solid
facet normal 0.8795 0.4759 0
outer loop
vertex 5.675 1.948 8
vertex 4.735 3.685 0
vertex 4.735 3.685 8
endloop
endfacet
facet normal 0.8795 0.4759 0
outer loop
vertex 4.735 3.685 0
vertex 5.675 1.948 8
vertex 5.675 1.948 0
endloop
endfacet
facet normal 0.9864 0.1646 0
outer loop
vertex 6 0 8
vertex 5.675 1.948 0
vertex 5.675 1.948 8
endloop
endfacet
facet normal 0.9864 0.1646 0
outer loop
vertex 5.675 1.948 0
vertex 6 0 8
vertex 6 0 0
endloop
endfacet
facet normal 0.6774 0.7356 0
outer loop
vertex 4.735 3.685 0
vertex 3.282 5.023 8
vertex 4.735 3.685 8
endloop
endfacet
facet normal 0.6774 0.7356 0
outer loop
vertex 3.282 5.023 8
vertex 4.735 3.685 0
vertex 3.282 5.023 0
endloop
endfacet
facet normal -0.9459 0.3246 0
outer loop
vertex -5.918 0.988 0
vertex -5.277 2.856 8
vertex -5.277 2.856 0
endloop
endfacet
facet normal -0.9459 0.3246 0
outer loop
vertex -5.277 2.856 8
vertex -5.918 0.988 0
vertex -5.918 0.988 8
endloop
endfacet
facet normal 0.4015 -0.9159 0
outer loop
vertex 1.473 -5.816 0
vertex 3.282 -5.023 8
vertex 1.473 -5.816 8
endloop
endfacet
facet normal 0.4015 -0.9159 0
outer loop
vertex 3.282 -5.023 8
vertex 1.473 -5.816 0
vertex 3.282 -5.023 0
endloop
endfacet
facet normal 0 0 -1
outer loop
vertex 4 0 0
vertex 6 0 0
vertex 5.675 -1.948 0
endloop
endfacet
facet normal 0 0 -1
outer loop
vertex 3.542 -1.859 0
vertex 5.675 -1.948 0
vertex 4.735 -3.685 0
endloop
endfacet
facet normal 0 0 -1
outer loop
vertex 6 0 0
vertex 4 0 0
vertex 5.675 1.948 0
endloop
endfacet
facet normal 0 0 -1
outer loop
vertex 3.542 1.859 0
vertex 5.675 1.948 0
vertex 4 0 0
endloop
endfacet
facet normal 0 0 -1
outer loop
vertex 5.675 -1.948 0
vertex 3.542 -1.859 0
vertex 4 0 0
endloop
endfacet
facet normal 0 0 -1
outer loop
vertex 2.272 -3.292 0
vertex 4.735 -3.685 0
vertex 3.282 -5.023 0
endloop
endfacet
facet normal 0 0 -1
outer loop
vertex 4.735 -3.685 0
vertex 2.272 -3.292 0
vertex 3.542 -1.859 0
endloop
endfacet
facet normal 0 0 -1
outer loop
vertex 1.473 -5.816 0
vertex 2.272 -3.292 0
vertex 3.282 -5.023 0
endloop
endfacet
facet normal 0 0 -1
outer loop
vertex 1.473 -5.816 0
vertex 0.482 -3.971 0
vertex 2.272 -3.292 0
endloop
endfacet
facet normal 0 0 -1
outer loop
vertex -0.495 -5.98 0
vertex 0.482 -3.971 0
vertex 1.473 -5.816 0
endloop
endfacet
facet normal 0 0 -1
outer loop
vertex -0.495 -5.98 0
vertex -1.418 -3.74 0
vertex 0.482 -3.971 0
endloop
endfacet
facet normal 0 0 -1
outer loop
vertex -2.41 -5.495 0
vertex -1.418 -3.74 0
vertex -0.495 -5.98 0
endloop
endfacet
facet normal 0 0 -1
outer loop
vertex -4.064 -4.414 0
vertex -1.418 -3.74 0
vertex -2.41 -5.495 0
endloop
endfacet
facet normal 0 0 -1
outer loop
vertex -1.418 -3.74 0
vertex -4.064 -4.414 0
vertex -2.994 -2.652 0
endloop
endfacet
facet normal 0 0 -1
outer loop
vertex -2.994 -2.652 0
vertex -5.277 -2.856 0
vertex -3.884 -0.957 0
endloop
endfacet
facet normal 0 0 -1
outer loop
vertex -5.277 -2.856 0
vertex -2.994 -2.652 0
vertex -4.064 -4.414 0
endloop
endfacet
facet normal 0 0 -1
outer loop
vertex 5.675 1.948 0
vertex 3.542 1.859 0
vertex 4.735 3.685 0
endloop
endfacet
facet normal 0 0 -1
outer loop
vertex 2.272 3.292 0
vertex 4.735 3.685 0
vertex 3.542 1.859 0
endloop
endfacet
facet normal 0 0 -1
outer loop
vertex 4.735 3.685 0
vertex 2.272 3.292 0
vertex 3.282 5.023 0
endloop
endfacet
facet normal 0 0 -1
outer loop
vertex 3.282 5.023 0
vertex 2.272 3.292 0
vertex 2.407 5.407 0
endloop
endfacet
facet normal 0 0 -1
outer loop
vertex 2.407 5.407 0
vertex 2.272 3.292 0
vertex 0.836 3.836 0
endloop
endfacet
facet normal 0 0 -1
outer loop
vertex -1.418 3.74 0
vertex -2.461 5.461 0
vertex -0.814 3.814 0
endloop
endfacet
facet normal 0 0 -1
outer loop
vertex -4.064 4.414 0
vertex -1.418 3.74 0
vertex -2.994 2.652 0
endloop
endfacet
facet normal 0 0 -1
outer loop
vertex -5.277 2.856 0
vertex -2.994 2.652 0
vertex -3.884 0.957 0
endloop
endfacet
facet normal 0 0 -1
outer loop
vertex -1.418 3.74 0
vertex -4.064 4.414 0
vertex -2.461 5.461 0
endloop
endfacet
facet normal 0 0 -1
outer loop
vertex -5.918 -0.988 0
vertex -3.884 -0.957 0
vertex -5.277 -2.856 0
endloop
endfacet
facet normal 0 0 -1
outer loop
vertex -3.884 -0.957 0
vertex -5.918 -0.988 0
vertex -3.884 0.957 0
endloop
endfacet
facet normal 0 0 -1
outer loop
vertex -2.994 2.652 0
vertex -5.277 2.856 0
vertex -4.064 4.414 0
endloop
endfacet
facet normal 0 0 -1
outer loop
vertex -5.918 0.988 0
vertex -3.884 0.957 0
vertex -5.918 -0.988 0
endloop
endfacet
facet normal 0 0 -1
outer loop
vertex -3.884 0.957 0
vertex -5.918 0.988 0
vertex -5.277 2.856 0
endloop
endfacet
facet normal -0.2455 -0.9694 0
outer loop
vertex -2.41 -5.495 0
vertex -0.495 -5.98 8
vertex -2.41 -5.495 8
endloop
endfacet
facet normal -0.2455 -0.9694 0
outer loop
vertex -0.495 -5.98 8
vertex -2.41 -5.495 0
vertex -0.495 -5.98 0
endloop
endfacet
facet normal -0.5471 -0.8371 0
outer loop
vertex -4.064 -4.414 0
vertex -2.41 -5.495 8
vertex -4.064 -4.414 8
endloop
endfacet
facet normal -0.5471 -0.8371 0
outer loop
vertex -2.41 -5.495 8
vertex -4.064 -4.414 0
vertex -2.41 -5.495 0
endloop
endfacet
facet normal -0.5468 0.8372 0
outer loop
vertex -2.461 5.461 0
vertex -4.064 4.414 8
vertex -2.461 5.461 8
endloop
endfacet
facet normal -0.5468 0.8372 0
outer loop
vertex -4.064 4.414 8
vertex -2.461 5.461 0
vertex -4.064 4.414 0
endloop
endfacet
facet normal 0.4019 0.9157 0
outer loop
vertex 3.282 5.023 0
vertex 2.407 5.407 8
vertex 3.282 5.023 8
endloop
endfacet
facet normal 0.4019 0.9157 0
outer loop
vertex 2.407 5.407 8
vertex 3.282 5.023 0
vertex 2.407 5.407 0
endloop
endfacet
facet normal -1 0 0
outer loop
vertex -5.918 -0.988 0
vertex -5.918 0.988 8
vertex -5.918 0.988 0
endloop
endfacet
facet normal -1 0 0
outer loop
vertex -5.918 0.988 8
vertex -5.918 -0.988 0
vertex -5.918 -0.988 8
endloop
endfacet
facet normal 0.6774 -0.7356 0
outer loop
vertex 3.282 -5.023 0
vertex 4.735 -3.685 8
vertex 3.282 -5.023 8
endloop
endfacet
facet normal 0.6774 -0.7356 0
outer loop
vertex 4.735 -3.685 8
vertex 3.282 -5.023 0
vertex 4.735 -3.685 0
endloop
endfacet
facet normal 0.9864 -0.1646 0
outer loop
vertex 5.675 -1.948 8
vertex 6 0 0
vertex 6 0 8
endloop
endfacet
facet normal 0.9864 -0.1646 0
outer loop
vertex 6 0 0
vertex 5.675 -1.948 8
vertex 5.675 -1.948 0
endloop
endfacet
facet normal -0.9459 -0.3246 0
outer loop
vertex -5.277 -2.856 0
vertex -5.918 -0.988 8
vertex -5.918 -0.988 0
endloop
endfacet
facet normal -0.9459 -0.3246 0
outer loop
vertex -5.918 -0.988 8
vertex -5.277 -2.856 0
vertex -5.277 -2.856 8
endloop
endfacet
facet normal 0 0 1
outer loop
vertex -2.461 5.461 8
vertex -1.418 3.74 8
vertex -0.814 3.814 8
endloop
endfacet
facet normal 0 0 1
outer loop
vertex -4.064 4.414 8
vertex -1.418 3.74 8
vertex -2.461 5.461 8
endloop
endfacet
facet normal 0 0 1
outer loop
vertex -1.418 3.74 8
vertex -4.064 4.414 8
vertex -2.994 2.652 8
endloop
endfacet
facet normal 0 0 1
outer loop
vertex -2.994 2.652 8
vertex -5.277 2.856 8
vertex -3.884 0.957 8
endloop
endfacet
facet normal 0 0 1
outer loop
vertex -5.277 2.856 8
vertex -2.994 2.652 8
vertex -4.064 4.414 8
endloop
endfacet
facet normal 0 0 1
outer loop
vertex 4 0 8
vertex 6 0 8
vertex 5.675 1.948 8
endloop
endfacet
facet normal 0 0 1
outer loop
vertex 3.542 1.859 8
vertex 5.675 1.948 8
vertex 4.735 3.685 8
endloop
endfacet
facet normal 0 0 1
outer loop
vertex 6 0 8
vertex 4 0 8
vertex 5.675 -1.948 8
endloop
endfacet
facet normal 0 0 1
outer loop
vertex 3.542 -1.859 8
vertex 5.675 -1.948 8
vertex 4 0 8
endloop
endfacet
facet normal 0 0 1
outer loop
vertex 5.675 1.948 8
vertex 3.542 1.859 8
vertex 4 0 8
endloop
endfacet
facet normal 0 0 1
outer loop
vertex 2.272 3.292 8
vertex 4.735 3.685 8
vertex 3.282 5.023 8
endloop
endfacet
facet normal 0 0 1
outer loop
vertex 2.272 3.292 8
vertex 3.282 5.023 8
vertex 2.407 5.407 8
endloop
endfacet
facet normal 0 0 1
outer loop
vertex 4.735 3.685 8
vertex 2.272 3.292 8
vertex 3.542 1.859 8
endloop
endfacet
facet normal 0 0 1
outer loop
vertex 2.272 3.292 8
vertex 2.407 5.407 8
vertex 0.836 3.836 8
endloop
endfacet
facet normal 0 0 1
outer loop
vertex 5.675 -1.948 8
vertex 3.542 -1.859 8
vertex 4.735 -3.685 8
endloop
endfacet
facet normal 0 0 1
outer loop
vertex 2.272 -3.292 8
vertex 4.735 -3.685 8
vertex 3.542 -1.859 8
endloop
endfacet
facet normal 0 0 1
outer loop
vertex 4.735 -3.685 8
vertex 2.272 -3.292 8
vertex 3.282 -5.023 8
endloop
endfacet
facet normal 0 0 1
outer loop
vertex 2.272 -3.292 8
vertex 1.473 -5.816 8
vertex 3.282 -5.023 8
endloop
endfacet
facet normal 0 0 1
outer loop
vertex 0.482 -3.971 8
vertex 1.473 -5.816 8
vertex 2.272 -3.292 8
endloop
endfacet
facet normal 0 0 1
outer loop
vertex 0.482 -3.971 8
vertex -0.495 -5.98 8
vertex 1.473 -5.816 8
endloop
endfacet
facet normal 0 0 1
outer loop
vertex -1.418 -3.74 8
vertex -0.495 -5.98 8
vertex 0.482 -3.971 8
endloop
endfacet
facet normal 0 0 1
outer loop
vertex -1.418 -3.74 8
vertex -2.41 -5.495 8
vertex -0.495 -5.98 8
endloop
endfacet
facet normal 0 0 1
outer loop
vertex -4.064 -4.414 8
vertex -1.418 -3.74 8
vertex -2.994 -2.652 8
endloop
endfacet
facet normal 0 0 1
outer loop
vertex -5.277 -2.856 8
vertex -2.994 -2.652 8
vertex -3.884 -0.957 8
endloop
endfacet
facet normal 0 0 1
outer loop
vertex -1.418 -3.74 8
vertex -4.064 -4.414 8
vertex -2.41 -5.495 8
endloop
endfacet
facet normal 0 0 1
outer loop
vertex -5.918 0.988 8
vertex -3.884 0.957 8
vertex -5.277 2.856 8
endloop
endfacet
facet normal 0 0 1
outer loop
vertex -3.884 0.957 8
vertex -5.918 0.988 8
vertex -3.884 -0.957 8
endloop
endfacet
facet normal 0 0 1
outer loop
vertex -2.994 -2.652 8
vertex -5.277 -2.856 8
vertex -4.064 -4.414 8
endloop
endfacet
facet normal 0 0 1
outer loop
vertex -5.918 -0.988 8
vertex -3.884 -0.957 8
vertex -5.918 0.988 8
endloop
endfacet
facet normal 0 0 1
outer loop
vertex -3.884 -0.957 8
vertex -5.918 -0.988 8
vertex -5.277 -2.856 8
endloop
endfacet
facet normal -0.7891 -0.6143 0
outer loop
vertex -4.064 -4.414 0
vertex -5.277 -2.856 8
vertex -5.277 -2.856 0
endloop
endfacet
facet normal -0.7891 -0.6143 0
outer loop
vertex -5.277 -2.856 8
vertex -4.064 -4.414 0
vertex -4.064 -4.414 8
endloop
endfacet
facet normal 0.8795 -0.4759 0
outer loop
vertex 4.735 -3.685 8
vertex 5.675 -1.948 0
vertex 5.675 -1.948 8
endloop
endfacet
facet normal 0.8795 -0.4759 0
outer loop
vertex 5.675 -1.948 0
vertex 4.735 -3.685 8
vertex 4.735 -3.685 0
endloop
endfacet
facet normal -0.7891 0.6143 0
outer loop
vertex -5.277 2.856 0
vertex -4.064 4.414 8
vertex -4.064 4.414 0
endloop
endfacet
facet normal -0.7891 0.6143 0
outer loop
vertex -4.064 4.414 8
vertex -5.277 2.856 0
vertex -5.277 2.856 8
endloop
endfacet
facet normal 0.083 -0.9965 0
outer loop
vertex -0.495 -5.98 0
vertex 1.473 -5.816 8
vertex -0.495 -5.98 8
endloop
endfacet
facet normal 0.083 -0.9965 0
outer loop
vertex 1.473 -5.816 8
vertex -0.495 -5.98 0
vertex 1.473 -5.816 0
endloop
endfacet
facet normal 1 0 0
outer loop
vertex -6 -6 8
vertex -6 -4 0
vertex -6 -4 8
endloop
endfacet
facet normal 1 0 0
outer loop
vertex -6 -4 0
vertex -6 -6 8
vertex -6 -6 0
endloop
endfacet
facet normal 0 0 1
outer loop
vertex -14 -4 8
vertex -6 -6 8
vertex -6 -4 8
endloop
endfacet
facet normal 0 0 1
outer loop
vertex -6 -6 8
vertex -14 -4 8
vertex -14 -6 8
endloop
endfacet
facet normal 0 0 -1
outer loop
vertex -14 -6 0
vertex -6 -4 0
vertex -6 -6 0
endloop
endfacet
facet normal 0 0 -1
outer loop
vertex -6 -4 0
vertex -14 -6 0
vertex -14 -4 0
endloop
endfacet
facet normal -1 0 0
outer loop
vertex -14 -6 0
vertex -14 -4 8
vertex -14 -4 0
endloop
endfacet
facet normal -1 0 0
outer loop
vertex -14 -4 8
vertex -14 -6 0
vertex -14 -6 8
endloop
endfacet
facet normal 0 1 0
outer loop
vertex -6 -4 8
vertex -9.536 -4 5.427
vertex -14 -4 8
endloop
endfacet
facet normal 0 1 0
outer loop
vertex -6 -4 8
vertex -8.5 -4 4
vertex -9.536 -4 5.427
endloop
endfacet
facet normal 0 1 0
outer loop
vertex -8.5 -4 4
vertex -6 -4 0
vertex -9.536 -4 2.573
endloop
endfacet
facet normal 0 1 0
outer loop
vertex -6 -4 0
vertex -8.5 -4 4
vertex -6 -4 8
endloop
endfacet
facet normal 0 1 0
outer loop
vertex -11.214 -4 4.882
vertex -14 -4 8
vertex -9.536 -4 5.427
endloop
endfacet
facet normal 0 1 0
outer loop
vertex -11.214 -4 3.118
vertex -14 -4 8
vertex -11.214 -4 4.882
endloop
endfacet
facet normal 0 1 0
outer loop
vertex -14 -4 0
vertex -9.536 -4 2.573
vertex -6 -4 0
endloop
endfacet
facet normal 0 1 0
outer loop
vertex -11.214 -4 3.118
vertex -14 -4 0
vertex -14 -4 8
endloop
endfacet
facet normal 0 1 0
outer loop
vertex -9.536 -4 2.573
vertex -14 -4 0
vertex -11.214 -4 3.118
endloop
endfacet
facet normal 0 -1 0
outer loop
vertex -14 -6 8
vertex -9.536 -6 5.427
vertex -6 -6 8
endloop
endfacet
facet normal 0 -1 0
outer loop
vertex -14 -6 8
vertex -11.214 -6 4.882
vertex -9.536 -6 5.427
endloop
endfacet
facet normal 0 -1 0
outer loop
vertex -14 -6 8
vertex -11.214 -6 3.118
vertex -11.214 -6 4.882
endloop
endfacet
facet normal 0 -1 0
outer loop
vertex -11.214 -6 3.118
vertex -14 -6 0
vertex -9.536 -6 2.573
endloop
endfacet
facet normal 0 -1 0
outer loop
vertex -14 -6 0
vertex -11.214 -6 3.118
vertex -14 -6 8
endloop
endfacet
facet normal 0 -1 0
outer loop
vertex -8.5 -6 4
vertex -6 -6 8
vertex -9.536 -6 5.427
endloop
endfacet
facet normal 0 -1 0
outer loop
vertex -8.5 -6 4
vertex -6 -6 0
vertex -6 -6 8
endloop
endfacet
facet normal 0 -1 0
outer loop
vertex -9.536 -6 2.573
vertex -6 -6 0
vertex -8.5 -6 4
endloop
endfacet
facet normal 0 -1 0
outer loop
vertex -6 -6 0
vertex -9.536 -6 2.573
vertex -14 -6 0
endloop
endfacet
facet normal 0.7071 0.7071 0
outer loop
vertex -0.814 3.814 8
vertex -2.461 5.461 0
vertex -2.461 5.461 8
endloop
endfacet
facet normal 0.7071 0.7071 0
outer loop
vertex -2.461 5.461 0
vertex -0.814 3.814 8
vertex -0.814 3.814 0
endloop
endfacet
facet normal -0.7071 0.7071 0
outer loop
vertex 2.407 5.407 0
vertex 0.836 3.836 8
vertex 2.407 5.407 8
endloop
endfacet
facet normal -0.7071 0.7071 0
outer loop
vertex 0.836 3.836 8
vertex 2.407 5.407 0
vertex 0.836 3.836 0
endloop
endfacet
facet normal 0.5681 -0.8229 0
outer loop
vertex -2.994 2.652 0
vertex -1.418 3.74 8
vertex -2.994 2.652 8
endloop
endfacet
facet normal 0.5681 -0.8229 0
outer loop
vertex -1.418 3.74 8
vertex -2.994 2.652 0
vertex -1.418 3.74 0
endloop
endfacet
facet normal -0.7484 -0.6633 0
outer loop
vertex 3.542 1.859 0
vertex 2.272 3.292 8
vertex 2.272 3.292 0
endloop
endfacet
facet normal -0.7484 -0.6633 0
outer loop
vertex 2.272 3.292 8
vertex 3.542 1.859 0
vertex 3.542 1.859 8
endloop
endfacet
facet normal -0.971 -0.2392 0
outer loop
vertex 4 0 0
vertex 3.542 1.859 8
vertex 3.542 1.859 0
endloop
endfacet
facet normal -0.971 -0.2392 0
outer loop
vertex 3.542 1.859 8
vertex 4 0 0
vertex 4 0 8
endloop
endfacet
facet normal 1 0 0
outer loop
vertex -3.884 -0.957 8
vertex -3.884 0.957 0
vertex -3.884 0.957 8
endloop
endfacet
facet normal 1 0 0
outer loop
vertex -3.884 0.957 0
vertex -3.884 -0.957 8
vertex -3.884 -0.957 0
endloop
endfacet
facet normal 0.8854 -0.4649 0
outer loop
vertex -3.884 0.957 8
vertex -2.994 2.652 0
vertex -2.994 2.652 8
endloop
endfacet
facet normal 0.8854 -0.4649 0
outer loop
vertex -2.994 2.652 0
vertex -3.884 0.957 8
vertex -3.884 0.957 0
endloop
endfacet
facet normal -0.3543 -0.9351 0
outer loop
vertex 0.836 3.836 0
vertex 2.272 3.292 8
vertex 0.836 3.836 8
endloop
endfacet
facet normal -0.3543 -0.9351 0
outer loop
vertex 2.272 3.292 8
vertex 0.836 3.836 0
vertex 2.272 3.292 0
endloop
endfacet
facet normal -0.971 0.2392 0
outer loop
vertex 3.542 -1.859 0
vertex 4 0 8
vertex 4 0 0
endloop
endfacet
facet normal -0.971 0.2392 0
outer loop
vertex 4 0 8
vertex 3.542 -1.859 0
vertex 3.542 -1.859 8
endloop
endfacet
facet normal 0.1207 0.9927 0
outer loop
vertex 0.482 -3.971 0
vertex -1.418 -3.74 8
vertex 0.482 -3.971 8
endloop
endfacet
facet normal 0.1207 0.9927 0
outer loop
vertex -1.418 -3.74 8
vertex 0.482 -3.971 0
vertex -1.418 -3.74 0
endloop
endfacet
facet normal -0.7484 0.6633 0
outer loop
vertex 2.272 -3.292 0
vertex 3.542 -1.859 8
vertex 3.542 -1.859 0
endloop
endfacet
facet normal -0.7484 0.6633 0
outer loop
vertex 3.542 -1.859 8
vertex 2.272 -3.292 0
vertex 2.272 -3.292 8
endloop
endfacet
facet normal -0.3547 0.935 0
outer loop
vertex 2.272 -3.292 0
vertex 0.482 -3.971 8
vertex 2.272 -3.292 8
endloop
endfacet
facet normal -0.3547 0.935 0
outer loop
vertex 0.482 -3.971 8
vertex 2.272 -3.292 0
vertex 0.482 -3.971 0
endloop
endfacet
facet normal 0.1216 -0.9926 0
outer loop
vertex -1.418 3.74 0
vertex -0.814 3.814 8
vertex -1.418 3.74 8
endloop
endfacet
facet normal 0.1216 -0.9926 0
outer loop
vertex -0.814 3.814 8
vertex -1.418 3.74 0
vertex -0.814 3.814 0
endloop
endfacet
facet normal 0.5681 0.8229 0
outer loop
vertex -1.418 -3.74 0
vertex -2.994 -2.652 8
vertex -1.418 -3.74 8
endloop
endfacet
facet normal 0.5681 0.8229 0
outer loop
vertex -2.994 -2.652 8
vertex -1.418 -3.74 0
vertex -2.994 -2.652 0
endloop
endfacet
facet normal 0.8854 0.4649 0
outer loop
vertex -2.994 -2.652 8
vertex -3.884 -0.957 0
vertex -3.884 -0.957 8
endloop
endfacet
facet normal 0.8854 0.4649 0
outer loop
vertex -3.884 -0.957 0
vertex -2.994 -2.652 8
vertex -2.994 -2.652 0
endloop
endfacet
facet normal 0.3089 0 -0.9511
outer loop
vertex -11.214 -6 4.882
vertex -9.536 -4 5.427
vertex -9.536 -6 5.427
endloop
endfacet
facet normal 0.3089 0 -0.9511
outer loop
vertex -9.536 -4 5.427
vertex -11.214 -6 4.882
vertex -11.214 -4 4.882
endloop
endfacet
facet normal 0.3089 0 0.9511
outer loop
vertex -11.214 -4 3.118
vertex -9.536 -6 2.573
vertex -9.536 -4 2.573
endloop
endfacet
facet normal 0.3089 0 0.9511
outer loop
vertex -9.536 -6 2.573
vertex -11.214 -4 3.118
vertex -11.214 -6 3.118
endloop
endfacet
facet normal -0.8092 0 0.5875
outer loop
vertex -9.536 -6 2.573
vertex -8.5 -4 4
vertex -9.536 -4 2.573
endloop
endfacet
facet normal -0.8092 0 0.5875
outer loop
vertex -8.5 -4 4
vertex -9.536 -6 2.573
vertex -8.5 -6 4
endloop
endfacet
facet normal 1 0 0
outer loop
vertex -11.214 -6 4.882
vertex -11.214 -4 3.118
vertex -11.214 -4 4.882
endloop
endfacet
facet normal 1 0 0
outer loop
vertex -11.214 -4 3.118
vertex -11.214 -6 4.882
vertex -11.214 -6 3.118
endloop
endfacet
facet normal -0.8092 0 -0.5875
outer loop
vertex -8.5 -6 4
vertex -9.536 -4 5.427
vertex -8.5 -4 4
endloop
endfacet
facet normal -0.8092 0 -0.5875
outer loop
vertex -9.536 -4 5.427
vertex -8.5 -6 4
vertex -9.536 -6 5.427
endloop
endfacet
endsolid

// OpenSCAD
// Zweck: Kabelclip – Ring mit Öffnung, Schraublasche; intersection schneidet die Öffnung.
d_cable = 8; wall = 2; w = 8;
r_o = d_cable / 2 + wall;
difference() {
    union() {
        cylinder(h = w, r = r_o);
        translate([-r_o - 8, -r_o, 0]) cube([8, wall, w]);
    }
    translate([0, 0, -1]) cylinder(h = w + 2, d = d_cable);
    // Öffnung oben: Keil aus intersection von Würfel und gedrehtem Würfel
    intersection() {
        translate([-3, 0, -1]) cube([6, r_o + 1, w + 2]);
        translate([0, r_o / 2, -1]) rotate([0, 0, 45]) cube([r_o, r_o, w + 2]);
    }
    translate([-r_o - 4, -r_o - 1, w / 2]) rotate([-90, 0, 0]) cylinder(h = wall + 2, d = 3);
}
